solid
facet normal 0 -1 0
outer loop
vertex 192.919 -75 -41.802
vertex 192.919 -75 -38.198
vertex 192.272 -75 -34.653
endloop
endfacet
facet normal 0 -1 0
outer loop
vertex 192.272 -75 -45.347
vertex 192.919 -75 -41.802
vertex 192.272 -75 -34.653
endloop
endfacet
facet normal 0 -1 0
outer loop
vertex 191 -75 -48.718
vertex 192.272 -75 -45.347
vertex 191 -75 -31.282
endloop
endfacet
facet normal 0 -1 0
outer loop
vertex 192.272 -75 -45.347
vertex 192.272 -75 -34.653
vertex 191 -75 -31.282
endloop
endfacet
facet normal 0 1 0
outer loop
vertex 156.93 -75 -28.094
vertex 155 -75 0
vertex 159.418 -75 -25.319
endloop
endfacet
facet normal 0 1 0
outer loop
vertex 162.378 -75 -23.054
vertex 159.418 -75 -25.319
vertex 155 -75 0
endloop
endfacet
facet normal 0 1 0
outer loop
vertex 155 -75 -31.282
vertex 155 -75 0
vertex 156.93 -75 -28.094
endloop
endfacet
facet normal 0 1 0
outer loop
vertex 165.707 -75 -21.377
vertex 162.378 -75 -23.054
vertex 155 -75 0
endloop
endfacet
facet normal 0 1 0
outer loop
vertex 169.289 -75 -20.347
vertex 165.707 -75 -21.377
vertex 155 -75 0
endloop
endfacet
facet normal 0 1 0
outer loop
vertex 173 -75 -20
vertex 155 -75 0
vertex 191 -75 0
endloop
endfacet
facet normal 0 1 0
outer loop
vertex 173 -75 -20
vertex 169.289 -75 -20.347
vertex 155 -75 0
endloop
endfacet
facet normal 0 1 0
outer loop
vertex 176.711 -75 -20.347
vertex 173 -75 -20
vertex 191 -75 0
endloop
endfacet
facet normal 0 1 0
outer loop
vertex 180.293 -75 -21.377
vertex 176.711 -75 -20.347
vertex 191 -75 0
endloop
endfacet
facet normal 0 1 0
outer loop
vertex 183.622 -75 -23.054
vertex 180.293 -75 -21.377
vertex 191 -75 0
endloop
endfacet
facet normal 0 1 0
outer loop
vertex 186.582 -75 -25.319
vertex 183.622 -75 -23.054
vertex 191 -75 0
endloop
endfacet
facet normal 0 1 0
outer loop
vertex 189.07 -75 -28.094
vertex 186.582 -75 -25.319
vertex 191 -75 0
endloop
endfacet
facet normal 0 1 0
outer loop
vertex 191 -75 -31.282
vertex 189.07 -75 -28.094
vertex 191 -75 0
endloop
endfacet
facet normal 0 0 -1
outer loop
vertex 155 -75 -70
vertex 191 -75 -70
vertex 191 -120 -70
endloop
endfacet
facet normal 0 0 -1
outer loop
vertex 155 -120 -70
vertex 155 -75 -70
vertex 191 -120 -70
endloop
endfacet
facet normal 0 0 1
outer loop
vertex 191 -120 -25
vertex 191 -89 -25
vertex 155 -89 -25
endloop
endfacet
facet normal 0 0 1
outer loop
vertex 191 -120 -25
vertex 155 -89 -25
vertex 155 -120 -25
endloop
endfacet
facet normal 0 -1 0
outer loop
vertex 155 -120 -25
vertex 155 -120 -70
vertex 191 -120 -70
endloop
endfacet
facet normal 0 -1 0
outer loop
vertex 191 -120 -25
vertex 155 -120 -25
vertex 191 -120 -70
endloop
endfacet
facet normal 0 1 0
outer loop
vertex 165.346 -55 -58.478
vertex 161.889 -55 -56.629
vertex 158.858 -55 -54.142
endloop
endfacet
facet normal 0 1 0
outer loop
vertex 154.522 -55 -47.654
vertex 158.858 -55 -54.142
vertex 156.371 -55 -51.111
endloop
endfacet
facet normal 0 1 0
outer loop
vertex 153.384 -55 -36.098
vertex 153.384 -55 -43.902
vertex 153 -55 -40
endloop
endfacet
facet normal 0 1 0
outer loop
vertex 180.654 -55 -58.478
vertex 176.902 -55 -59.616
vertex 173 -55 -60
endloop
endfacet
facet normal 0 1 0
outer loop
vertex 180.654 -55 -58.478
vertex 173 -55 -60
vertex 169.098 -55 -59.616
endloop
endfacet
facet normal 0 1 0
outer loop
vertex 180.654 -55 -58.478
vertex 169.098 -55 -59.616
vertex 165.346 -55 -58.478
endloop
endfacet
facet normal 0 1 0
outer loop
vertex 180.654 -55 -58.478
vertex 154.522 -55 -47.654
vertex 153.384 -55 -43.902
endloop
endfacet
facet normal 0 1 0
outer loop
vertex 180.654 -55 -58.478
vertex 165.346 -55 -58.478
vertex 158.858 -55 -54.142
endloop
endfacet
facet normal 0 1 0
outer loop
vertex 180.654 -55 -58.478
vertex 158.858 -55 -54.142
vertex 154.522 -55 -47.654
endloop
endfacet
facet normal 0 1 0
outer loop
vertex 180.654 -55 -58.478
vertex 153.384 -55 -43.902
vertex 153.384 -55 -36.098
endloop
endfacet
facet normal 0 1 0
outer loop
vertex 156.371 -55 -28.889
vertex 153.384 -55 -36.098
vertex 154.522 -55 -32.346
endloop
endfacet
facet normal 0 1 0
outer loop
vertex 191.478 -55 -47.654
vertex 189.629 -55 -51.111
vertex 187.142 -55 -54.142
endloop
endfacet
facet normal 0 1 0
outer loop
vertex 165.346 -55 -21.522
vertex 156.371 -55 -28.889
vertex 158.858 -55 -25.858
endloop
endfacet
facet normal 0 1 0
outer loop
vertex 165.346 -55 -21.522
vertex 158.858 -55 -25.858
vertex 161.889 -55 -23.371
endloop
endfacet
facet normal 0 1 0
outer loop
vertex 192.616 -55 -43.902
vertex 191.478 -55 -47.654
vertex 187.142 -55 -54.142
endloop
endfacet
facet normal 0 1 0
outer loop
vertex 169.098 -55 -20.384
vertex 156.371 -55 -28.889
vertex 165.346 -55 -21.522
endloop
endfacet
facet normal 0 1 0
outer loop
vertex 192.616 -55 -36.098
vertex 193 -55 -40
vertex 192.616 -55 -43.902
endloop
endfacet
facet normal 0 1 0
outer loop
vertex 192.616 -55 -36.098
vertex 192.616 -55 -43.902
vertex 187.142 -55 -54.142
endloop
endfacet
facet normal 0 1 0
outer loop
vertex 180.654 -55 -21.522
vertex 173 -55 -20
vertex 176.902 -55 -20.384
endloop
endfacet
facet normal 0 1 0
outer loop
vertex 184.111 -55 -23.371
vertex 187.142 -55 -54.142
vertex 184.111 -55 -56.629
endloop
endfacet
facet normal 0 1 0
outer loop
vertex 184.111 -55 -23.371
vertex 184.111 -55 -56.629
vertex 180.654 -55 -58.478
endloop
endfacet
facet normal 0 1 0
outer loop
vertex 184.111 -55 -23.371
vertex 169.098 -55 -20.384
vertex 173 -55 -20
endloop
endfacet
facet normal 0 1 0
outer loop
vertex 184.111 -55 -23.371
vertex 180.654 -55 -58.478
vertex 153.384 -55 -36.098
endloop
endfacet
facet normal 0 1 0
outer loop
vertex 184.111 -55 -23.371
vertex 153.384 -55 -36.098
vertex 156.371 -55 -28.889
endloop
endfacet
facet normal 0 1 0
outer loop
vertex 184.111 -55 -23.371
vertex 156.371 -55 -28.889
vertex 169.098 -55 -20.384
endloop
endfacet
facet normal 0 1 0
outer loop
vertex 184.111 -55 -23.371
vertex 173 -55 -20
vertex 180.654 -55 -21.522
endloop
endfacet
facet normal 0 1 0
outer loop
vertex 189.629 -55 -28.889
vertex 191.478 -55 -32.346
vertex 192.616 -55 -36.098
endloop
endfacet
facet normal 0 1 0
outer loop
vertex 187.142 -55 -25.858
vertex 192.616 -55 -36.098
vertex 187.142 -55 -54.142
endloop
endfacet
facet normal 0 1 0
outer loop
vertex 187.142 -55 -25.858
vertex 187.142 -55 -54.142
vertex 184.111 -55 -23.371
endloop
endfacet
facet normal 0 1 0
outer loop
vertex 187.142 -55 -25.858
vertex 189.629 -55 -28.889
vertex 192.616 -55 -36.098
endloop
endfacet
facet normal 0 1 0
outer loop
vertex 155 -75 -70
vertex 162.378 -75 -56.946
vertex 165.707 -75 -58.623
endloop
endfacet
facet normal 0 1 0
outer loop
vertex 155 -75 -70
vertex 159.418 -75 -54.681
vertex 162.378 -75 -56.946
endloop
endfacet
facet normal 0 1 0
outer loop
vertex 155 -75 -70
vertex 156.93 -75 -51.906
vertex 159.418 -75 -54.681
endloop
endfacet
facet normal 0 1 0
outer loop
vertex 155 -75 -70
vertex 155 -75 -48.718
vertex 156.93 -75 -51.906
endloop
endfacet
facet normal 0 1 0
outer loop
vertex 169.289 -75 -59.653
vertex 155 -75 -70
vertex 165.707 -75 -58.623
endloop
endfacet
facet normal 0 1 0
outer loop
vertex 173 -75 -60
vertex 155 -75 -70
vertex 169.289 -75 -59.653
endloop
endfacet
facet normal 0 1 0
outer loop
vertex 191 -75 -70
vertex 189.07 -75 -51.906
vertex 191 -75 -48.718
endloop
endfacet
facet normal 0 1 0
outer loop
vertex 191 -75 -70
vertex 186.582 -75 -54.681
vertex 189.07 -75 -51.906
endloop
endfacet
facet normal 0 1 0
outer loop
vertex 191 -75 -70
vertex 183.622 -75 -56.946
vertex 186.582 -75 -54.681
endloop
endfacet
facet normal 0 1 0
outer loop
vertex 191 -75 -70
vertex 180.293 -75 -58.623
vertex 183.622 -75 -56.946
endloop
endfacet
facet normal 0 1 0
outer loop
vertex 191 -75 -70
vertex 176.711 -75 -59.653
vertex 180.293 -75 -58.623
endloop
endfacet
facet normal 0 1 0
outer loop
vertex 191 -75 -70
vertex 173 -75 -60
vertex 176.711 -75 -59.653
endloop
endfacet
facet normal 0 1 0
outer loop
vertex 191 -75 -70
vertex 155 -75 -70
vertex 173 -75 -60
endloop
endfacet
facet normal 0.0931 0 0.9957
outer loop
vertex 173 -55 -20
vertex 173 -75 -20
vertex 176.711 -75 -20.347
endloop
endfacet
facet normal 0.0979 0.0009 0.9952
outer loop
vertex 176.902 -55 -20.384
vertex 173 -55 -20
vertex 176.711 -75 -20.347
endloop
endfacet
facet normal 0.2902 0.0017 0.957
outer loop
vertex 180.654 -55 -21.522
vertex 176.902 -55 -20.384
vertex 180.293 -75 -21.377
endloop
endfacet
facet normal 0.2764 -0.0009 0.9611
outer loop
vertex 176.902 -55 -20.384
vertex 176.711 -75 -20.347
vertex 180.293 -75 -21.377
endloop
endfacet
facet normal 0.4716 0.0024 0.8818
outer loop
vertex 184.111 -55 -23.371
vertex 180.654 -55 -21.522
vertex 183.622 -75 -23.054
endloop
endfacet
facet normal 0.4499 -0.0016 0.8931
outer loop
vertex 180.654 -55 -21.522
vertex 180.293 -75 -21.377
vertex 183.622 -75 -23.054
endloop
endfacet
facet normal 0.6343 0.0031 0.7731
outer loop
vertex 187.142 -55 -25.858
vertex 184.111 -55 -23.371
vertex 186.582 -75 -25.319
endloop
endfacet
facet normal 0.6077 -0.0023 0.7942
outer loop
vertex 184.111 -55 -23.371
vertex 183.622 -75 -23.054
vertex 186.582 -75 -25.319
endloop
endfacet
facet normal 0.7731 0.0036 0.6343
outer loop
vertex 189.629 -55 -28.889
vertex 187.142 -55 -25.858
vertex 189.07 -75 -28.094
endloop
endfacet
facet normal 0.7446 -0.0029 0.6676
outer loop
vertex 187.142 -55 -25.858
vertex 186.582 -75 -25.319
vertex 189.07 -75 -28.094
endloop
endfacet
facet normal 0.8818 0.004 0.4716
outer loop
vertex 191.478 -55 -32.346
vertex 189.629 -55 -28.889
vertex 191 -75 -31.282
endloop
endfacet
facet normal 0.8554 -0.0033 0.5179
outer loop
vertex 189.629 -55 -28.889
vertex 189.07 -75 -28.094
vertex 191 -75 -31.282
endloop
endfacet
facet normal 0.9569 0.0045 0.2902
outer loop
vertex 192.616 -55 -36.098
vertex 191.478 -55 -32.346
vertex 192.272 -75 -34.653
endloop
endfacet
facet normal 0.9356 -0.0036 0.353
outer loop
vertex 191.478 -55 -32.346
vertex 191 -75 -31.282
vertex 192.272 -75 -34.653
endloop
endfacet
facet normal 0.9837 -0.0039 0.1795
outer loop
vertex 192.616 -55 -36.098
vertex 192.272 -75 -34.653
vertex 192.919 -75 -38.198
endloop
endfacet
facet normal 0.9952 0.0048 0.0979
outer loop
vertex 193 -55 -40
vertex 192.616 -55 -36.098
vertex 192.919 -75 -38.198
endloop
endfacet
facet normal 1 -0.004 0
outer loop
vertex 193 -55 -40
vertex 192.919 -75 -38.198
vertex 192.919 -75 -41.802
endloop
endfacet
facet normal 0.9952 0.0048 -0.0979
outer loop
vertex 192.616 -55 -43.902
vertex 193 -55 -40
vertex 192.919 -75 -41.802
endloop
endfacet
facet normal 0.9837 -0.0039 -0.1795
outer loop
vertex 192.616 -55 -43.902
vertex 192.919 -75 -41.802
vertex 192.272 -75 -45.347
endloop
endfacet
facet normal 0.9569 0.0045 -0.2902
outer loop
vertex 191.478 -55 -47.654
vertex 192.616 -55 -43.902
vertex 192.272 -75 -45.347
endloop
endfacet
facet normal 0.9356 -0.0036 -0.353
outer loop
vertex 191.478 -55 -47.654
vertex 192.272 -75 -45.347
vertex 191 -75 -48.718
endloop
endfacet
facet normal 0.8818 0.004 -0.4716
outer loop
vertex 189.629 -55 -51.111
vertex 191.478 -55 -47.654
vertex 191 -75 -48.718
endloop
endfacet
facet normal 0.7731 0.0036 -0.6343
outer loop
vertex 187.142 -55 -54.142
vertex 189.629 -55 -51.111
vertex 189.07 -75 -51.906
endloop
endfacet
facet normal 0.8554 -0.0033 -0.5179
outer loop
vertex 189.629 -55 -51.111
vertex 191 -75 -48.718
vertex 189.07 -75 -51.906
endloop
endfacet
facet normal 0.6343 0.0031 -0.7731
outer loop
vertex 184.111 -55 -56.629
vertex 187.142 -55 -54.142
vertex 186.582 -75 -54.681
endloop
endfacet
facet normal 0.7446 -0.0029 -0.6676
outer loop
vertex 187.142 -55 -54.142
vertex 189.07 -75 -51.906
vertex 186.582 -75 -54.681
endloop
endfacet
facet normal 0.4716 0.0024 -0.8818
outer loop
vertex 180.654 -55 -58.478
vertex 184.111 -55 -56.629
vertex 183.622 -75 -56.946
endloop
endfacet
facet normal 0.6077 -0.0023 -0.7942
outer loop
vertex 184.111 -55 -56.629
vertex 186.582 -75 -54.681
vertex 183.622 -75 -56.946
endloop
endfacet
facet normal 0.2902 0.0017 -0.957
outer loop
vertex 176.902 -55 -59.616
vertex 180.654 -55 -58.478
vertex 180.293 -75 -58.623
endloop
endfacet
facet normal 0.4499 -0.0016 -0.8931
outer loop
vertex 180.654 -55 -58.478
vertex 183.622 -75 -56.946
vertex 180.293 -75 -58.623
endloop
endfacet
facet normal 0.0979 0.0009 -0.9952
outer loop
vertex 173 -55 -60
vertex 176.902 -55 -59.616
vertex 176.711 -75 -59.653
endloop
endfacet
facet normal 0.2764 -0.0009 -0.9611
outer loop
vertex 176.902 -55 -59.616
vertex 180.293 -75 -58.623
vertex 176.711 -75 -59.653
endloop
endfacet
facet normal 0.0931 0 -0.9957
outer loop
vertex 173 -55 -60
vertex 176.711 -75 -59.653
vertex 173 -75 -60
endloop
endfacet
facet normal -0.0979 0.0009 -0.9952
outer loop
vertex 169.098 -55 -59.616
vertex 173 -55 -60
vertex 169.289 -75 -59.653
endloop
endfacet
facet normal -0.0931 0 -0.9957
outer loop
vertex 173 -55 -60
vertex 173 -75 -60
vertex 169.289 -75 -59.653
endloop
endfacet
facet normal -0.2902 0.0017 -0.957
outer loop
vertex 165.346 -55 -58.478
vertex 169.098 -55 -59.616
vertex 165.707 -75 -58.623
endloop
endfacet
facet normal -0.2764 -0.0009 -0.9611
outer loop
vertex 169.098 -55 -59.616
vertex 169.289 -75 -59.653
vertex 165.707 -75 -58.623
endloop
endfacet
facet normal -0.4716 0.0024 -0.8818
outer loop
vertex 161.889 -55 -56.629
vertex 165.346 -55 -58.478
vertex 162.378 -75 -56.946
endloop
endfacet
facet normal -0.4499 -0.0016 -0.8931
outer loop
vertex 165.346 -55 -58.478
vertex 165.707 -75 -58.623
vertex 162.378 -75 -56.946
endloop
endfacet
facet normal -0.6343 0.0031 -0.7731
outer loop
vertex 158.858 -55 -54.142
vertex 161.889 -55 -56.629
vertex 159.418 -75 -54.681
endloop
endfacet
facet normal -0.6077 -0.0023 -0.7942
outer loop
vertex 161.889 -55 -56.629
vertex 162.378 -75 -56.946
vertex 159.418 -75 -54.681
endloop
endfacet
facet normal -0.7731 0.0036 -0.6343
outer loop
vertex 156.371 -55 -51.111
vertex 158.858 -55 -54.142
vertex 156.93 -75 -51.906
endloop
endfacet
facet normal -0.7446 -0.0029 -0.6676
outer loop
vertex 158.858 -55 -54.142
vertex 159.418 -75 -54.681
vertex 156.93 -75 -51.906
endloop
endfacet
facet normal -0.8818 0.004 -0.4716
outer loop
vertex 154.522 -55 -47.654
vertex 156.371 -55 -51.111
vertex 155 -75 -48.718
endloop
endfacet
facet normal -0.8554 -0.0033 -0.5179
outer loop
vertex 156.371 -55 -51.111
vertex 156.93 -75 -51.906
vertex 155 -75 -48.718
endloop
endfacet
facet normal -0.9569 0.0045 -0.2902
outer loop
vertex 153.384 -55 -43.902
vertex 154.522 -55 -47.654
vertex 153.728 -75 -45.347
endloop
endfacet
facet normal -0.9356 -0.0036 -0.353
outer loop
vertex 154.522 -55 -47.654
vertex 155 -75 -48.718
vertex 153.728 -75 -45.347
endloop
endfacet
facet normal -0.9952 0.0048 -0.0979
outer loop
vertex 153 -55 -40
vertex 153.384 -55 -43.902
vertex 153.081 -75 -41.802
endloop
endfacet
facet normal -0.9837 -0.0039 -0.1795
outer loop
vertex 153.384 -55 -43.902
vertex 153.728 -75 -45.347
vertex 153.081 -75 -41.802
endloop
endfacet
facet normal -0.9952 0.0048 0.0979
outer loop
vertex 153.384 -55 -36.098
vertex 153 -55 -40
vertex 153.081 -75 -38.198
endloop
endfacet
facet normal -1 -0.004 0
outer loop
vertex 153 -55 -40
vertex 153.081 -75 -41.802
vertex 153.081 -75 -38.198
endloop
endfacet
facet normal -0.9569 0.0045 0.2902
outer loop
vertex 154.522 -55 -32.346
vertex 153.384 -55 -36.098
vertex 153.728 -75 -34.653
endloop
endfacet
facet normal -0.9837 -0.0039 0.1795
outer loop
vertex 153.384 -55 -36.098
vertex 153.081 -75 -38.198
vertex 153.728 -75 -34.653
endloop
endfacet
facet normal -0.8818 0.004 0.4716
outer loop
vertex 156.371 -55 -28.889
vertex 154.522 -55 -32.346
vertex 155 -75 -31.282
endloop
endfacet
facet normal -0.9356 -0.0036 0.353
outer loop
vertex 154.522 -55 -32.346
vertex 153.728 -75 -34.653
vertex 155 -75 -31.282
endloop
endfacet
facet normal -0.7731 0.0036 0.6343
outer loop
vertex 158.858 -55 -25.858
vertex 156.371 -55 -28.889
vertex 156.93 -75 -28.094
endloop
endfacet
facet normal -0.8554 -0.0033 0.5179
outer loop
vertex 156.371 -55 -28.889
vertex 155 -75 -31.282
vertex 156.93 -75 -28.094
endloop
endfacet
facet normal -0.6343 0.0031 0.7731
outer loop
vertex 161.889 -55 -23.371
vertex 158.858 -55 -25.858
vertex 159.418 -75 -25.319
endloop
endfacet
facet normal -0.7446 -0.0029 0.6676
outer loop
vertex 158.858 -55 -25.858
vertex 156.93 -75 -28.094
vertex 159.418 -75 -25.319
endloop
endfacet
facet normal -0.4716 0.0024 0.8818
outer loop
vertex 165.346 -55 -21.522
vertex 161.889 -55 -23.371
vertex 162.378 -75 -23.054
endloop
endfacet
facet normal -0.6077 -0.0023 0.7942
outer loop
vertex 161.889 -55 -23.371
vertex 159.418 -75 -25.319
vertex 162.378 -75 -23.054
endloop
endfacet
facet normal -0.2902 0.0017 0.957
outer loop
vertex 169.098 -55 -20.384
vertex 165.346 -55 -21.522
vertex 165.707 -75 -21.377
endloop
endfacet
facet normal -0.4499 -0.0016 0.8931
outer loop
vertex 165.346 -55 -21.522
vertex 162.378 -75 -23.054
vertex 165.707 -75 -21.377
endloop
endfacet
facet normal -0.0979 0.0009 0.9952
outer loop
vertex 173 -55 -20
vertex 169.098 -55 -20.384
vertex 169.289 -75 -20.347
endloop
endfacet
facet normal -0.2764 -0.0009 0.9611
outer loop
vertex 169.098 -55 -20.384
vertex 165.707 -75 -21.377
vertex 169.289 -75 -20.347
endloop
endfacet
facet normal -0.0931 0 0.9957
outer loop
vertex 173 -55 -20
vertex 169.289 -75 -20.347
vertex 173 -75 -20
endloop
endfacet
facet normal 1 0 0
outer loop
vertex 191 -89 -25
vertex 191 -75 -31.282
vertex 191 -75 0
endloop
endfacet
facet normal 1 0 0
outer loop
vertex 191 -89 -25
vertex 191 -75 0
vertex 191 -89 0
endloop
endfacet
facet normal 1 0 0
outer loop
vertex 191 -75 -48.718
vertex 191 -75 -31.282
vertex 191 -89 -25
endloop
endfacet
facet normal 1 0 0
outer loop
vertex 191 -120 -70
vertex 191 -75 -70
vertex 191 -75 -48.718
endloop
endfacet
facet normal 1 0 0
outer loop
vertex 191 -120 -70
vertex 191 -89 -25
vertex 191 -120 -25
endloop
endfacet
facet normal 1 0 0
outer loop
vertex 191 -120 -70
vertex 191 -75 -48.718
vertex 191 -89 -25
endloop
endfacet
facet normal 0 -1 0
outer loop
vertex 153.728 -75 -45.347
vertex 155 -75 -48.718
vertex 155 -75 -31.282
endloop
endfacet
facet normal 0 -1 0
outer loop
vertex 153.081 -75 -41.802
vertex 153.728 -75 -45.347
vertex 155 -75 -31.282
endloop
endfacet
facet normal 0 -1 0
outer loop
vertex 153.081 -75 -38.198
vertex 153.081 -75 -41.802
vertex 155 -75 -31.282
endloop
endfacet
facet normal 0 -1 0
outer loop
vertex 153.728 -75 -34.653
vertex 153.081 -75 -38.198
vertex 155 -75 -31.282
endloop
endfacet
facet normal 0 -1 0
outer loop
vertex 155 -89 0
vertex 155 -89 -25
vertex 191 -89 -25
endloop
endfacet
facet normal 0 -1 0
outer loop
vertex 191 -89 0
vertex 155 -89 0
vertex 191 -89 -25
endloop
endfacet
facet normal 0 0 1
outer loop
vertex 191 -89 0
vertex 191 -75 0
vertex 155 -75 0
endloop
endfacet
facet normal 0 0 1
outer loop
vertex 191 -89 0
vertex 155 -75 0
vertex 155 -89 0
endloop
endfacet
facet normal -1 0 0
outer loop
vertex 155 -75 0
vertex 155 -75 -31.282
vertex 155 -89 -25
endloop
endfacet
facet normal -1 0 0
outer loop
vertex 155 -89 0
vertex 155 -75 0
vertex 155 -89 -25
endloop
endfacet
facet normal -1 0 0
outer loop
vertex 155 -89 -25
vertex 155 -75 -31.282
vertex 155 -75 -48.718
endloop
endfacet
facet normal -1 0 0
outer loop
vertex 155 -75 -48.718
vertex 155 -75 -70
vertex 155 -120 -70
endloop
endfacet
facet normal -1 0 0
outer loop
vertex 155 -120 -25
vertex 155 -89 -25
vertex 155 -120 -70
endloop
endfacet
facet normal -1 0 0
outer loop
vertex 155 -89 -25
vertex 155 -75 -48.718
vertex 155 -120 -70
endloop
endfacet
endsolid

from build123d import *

# Parameters (mm, degrees)
BOX048_W                  = 45
BOX048_H                  = 36
BOX048_DEPTH              = 45
BOX049_W                  = 14
BOX049_H                  = 36
BOX049_DEPTH              = 70
CYLINDER021_R             = 20
CYLINDER021_DEPTH         = 20
FUSION014_PLACEMENT_ANGLE = 90


with BuildPart() as cube043:
    # Box048 → Box048 (new body)
    with BuildSketch(Plane.XY):
        with Locations((22.5, 18)):
            Rectangle(BOX048_W, BOX048_H)
    extrude(amount=BOX048_DEPTH)


with BuildPart() as cube044:
    # Box049 → Box049 (new body)
    with BuildSketch(Plane.XY):
        with Locations((7, 18)):
            Rectangle(BOX049_W, BOX049_H)
    extrude(amount=BOX049_DEPTH)


with BuildPart() as block:
    # Cylinder021 → Cylinder021 (new body)
    with BuildSketch(Plane(origin=(0, 18, 30), x_dir=(0, 0, 1), z_dir=(-1, 0, 0))):
        Circle(CYLINDER021_R)
    extrude(amount=CYLINDER021_DEPTH)

    # Fusion014: union Cube043, Cube044
    add(cube043.part)
    add(cube044.part)


with BuildPart() as block_1:
    # Fusion014 placement: moved
    add(block.part.moved(Location((155, -75, -70))).rotate(Axis((155, -75, -70), (0, 0, -1)), FUSION014_PLACEMENT_ANGLE))


solid = block_1.part
